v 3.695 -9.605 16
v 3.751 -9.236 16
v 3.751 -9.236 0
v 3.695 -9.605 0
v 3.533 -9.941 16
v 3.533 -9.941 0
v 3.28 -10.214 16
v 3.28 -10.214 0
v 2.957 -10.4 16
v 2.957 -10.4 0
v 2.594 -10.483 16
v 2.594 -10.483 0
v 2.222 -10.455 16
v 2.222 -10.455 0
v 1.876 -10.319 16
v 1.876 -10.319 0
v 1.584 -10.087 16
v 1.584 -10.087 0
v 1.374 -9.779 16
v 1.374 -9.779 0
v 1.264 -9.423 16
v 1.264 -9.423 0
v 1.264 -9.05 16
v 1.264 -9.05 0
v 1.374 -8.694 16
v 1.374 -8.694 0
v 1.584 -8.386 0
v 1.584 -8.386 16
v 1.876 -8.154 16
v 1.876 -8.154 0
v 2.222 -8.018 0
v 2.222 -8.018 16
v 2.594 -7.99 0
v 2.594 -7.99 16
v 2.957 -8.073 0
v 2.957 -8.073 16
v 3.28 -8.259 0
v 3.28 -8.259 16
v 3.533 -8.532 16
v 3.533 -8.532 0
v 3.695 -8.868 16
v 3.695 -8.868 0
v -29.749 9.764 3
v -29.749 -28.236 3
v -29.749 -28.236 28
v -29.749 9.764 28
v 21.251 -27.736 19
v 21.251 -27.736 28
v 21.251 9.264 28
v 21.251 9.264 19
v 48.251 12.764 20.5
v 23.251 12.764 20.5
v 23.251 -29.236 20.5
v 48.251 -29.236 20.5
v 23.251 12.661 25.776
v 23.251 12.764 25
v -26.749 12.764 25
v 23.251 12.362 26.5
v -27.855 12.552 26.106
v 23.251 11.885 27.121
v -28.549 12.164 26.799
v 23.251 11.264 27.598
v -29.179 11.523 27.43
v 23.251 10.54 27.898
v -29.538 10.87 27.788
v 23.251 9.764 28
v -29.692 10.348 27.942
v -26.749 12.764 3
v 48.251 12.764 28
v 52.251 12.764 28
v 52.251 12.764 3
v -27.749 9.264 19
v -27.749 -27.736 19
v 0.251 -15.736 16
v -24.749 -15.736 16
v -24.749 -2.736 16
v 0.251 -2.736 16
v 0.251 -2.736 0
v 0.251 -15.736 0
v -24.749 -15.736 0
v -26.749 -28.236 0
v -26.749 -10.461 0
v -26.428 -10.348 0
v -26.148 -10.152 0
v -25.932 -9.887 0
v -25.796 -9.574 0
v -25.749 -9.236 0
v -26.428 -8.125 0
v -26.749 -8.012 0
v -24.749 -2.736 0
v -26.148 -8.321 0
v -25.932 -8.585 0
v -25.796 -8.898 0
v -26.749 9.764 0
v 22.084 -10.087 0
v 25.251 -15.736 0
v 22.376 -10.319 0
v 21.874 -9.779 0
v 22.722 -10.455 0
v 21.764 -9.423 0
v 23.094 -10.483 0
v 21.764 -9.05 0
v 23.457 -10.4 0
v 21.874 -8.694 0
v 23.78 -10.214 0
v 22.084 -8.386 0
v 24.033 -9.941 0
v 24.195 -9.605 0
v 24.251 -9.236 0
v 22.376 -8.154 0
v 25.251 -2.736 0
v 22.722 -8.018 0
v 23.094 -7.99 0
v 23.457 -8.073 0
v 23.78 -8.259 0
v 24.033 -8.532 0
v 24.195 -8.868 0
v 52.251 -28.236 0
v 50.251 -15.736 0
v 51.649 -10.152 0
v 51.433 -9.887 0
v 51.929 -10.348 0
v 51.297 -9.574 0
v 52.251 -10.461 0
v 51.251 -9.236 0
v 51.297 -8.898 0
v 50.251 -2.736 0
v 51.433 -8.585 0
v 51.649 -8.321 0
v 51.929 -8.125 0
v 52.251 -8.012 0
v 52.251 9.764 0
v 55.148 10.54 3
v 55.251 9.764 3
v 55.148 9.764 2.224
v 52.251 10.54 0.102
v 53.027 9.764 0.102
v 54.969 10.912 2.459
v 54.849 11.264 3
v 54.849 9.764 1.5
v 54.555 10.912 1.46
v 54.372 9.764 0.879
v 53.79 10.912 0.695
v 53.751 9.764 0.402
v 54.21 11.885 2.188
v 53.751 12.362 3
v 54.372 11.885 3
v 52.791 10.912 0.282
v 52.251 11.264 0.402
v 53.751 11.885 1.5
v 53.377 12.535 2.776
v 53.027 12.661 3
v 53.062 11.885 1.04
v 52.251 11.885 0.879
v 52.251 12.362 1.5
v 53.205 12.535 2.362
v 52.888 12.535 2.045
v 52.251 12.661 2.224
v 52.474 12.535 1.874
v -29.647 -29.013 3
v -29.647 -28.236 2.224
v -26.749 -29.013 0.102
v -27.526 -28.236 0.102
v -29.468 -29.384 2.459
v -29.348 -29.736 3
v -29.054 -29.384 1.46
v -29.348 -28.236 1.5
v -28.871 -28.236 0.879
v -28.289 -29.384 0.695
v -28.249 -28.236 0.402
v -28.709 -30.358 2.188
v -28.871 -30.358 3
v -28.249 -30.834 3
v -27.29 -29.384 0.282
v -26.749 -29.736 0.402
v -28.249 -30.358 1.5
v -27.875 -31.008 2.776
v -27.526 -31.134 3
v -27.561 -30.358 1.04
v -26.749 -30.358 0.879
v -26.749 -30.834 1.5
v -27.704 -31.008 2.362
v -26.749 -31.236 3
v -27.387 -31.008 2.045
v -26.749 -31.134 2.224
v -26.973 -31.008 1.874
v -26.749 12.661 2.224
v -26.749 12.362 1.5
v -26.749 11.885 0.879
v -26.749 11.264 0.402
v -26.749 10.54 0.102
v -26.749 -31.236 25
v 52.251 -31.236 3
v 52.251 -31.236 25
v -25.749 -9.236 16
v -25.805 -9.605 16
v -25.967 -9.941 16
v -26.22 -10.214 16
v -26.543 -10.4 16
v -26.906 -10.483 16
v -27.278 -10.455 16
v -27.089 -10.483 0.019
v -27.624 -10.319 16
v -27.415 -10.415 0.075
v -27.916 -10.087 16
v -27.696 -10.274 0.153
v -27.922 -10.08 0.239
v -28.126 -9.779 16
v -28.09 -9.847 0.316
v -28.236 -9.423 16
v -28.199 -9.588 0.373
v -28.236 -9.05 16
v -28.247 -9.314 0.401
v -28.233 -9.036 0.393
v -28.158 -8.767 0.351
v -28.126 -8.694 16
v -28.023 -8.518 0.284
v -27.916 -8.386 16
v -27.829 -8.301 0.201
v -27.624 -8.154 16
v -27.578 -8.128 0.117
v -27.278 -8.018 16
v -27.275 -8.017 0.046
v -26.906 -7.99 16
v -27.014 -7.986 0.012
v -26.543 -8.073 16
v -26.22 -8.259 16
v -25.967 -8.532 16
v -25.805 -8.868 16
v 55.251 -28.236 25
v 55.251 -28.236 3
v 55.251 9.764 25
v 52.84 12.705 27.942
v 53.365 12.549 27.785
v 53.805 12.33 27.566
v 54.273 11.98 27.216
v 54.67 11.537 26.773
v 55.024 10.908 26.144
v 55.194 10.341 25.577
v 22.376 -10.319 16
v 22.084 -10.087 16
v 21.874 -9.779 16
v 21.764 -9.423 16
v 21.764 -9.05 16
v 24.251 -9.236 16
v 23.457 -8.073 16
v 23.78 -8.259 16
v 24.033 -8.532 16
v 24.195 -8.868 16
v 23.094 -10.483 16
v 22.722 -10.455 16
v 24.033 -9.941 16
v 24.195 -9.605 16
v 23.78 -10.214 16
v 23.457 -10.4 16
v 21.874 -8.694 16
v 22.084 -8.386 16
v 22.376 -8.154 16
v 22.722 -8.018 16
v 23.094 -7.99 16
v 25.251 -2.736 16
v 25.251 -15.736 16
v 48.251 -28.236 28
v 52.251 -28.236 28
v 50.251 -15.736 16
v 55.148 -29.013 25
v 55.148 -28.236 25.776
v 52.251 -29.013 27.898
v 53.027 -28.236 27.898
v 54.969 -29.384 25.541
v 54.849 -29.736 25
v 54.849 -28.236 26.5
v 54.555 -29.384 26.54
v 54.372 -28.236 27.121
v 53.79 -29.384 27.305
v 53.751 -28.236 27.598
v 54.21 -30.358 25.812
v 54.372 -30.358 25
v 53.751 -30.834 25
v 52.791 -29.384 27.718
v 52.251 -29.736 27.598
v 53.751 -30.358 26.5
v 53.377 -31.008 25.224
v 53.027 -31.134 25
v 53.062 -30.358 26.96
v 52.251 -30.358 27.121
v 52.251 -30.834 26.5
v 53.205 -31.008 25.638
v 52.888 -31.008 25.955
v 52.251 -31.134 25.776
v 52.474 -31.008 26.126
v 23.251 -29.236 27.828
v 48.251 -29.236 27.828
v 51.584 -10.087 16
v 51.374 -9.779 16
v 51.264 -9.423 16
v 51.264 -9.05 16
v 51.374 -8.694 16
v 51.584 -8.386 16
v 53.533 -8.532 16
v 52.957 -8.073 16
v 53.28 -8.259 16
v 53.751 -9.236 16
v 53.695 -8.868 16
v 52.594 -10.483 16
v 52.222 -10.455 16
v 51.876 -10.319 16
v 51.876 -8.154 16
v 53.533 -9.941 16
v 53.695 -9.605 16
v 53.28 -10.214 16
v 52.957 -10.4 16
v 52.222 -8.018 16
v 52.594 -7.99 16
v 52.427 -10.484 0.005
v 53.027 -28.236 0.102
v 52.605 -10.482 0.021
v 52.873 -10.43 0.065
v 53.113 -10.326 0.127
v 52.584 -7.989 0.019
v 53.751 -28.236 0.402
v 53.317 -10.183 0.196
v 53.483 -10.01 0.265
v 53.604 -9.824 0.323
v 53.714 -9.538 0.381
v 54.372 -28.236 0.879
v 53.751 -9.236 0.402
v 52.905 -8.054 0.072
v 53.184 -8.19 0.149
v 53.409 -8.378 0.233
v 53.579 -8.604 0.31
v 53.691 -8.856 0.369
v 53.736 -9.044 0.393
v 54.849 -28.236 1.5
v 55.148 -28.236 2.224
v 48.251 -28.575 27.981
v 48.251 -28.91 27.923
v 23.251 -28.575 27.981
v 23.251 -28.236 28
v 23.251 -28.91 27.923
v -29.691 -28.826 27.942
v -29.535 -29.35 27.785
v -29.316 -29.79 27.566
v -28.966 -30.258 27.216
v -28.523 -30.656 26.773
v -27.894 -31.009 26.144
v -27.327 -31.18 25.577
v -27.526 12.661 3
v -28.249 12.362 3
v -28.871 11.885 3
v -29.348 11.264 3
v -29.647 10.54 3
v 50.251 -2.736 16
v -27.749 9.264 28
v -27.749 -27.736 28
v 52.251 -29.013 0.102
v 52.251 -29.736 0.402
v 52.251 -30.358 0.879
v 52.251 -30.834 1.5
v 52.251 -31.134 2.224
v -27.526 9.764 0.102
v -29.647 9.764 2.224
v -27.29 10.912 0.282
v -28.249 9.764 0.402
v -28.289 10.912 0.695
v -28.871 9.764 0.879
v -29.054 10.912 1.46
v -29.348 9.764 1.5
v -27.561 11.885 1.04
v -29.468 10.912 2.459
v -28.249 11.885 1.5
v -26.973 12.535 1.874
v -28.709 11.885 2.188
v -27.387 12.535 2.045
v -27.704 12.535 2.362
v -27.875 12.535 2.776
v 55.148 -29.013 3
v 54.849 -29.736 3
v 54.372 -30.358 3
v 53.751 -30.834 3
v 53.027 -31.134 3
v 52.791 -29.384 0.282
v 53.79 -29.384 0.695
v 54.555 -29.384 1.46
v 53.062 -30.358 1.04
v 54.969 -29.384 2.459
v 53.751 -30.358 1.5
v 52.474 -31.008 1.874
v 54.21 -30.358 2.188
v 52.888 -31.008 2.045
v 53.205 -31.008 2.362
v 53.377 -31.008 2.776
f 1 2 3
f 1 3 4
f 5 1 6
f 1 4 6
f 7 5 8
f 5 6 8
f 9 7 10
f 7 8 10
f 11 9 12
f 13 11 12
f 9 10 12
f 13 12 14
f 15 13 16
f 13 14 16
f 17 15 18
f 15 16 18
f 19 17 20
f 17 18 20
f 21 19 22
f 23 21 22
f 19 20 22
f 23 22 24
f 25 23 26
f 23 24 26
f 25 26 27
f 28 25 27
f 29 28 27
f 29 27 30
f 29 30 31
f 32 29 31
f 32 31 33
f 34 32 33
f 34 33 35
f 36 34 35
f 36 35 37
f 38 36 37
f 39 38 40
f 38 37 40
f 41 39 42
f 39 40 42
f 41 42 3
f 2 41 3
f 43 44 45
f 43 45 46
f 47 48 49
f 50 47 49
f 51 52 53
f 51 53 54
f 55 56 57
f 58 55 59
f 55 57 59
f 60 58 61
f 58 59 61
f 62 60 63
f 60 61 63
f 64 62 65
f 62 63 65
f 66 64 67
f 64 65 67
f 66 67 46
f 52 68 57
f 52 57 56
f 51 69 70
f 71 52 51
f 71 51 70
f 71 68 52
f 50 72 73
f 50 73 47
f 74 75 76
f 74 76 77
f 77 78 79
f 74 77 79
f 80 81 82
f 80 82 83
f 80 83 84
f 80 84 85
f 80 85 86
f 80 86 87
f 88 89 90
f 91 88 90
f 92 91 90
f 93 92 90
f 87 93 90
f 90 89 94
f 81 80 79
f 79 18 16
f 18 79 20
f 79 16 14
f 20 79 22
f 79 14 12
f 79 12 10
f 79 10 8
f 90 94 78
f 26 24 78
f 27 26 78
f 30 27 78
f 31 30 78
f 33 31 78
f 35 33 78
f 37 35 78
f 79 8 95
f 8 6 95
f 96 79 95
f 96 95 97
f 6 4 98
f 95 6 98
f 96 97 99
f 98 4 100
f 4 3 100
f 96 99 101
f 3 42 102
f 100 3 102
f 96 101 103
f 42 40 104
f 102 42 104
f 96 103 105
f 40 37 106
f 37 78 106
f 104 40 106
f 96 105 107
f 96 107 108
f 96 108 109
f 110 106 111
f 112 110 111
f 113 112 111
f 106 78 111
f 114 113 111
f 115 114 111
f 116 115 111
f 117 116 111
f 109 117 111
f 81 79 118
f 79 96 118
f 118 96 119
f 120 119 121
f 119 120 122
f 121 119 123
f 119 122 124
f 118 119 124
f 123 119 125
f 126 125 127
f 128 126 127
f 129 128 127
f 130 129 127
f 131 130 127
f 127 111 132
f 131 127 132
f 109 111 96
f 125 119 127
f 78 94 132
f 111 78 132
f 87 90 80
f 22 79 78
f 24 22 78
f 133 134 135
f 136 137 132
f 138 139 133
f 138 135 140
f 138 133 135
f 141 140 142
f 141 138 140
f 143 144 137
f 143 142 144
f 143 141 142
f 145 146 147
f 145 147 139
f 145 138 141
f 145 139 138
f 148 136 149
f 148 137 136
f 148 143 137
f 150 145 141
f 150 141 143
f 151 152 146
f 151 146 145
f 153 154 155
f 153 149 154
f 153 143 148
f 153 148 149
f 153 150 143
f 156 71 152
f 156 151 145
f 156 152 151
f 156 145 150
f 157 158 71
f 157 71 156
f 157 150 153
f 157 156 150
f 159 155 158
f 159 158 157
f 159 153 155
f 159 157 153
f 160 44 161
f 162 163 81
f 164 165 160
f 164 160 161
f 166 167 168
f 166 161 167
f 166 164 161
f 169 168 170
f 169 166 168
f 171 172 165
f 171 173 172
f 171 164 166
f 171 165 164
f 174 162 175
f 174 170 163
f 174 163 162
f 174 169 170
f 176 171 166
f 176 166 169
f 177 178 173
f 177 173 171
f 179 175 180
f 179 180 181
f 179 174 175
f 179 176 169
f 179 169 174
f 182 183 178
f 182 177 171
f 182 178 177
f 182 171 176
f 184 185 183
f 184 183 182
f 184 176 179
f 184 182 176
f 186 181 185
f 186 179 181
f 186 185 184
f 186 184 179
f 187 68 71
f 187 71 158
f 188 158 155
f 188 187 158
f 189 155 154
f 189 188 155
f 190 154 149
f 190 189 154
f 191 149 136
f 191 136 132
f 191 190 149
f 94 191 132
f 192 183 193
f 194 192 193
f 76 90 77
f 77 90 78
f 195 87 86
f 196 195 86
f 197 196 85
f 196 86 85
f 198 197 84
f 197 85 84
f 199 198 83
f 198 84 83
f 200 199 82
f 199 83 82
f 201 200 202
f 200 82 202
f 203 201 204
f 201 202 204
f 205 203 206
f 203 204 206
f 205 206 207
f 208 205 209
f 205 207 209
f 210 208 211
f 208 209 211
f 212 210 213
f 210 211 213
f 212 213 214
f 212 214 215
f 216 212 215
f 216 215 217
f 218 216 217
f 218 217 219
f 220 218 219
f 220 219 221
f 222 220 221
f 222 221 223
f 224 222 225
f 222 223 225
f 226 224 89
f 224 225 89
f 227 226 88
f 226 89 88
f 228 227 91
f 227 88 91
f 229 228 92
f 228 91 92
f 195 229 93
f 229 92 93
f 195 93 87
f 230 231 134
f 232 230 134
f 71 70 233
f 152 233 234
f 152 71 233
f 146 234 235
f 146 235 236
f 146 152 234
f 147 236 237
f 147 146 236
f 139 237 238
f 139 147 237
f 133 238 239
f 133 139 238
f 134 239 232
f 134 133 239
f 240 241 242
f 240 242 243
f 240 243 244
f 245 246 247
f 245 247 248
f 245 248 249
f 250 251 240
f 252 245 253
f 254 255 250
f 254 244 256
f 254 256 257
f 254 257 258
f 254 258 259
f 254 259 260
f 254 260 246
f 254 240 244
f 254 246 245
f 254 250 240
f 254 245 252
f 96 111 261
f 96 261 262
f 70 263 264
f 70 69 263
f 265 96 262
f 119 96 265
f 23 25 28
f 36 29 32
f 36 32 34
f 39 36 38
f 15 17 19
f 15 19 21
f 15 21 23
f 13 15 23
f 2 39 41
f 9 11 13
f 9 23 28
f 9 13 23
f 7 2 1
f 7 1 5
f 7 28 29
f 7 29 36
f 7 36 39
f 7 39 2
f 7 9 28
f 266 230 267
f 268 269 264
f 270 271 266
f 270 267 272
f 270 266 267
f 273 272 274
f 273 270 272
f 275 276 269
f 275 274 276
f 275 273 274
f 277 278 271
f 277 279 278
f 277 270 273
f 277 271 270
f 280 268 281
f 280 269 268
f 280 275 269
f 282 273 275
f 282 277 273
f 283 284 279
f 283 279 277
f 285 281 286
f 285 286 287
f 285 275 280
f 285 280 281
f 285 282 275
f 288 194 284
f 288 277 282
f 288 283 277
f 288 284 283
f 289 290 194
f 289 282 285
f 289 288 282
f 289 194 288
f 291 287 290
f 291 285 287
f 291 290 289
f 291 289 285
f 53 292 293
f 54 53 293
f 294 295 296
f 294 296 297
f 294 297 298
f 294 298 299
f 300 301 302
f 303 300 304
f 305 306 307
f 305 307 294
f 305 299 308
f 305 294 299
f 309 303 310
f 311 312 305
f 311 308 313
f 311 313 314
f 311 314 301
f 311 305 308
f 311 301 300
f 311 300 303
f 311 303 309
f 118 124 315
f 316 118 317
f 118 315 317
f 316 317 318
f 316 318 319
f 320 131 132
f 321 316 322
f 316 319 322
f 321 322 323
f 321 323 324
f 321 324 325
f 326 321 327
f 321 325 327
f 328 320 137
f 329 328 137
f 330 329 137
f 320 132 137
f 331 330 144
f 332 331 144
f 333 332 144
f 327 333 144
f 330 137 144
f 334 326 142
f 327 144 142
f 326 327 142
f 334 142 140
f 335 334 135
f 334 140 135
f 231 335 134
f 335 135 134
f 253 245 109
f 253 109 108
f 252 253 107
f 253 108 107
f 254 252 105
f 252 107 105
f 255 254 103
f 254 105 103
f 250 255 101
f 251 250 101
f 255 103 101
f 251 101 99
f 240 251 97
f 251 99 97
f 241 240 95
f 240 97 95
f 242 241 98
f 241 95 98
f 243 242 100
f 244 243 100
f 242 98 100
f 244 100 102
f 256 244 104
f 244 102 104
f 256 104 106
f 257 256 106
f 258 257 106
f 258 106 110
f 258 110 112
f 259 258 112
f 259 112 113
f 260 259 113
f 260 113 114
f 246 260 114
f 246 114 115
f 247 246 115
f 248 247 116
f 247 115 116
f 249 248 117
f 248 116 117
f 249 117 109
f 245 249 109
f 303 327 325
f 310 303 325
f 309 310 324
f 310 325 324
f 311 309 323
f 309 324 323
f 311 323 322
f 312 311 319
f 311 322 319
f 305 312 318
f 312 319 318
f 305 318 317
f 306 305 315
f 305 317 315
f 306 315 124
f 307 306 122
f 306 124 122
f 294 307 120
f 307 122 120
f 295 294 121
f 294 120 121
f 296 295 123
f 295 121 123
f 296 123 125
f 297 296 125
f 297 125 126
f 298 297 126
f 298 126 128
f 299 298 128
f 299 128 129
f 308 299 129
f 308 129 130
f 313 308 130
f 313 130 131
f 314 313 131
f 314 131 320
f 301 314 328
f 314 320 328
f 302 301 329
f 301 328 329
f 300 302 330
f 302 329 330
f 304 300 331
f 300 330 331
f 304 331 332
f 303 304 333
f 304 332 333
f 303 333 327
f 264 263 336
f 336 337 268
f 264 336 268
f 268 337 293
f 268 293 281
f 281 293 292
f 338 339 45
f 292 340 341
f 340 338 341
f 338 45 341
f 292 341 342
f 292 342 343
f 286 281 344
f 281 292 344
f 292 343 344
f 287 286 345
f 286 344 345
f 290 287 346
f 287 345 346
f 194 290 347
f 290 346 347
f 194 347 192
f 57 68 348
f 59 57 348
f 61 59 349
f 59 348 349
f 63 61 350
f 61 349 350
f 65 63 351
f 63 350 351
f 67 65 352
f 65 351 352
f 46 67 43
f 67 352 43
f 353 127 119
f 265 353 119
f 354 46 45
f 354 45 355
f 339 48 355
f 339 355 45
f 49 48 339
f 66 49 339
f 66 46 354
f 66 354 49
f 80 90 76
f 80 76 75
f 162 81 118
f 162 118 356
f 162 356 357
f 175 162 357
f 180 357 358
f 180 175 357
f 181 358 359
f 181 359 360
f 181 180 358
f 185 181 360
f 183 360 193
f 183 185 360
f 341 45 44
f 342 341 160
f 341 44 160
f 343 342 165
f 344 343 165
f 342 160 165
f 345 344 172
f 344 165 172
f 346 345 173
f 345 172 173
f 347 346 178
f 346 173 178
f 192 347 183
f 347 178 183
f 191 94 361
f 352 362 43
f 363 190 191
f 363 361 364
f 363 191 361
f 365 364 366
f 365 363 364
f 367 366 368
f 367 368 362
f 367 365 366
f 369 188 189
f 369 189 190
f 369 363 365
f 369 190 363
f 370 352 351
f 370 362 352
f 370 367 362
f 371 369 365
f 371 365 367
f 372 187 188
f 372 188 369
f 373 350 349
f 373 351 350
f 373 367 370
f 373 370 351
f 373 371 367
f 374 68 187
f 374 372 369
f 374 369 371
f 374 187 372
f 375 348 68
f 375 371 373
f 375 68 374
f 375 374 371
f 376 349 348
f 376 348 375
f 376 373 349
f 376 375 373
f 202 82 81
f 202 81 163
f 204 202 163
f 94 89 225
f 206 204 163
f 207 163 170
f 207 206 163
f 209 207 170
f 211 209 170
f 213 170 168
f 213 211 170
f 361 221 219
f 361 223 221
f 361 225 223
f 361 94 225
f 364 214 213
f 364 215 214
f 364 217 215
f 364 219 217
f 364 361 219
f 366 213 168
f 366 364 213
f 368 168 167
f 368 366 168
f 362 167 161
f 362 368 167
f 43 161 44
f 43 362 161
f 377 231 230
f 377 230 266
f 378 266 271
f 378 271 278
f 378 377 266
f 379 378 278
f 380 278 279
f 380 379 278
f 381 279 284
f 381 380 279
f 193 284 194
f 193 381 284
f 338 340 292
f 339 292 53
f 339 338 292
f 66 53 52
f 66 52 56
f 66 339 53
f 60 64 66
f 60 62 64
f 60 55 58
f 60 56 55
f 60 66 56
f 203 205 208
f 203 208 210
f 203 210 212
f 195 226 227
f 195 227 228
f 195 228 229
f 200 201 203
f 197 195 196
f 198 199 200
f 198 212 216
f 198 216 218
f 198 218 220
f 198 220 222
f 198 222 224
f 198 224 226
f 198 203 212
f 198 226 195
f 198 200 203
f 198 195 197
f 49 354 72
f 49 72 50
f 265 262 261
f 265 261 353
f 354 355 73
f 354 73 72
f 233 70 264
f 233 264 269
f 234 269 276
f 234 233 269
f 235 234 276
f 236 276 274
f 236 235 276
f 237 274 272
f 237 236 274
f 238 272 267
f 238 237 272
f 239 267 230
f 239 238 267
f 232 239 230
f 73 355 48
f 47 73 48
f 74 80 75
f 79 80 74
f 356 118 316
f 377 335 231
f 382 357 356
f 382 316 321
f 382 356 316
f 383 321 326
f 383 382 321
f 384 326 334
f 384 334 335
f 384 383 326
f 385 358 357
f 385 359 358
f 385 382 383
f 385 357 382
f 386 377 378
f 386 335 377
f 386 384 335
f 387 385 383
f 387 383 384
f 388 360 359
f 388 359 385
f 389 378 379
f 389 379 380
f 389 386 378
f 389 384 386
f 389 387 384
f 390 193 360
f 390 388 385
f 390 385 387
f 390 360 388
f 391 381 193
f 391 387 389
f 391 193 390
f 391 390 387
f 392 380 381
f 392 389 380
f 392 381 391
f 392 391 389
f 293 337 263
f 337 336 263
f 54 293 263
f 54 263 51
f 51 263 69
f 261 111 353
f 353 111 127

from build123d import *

# Parameters (mm, degrees)
F0_W         = 85
F0_H         = 44
F1_DEPTH     = 28
F2_W         = 49
F2_H         = 37
F3_DEPTH     = 9
F2_W_2       = 25
F2_H_2       = 42
F4_DEPTH     = 7.5
F5_W         = 25
F5_H         = 13
F5_R         = 1.25
F6_DEPTH     = 16
F7_T1_DEPTH  = 22
F7_T3_DEPTH  = 32.5
F7_T5_DEPTH  = 79
F7_T7_DEPTH  = 38
F7_T9_DEPTH  = 68
F7_T11_DEPTH = 89.5
F7_T13_DEPTH = 48.5
F7_S17_W     = 3
F7_S17_H     = 3
F7_T18_DEPTH = 3
F7_S23_W     = 3
F7_S23_H     = 3
F7_T24_DEPTH = 3
F7_S29_W     = 3
F7_S29_H     = 3
F7_T30_DEPTH = 3
F7_S35_W     = 3
F7_S35_H     = 3
F7_T36_DEPTH = 3
F7_S41_W     = 3
F7_S41_H     = 3
F7_T42_DEPTH = 3


# Not quite as in the source:
# - a fillet or chamfer that OpenCascade refuses, or shapes differently, is made with other operations: its cross-section is extruded or revolved along the edge and cut away or added


with BuildPart() as f1:
    # F0 (on Top) → F1 (new body)
    with BuildSketch(Plane.XY):
        with Locations((12.7505162358, -9.2363715138)):
            Rectangle(F0_W, F0_H)
    extrude(amount=F1_DEPTH)

    # F2 (on face) → F3 (cut)
    with BuildSketch(Plane.XY.offset(28)):
        with Locations((-3.2494837642, -9.2363715138)):
            Rectangle(F2_W, F2_H)
    extrude(amount=-F3_DEPTH, mode=Mode.SUBTRACT)

    # F2 (on face) → F4 (cut)
    with BuildSketch(Plane.XY.offset(28)):
        with Locations((35.7505162358, -8.2363715138)):
            Rectangle(F2_W_2, F2_H_2)
    extrude(amount=-F4_DEPTH, mode=Mode.SUBTRACT)

    # F5 (on face) → F6 (cut)
    with BuildSketch(Plane(origin=(0, 0, 0), x_dir=(1, 0, 0), z_dir=(0, 0, -1))):
        with Locations((-12.2494837642, 9.2363715138)):
            Rectangle(F5_W, F5_H)
        with Locations((37.7505162358, 9.2363715138)):
            Rectangle(F5_W, F5_H)
        with Locations((-26.9994837642, 9.2363715138)):
            Circle(F5_R)
        with Locations((2.5005162358, 9.2363715138)):
            Circle(F5_R)
        with Locations((23.0005162358, 9.2363715138)):
            Circle(F5_R)
        with Locations((52.5005162358, 9.2363715138)):
            Circle(F5_R)
    extrude(amount=-F6_DEPTH, mode=Mode.SUBTRACT)

    # F7: fillet of radius 3 on 11 edges, made by hand

    # F7_s2 → F7_t1 (cut)
    with BuildSketch(Plane.XY.offset(3)):
        with BuildLine():
            ThreePointArc((55.2505162358, -28.2363715138), (54.3718365794, -30.3576918574), (52.2505162358, -31.2363715138))
            Line((52.2505162358, -31.2363715138), (55.2505162358, -31.2363715138))
            Line((55.2505162358, -31.2363715138), (55.2505162358, -28.2363715138))
        make_face()
    extrude(amount=F7_T1_DEPTH, mode=Mode.SUBTRACT)

    # F7_s4 → F7_t3 (cut)
    with BuildSketch(Plane.XY.offset(3)):
        with BuildLine():
            ThreePointArc((52.2505162358, 12.7636284862), (54.3718365794, 11.8849488297), (55.2505162358, 9.7636284862))
            Line((55.2505162358, 9.7636284862), (55.2505162358, 12.7636284862))
            Line((55.2505162358, 12.7636284862), (52.2505162358, 12.7636284862))
        make_face()
        with BuildLine():
            ThreePointArc((-29.7494837642, -28.2363715138), (-28.8708041077, -30.3576918574), (-26.7494837642, -31.2363715138))
            Line((-26.7494837642, -31.2363715138), (-29.7494837642, -31.2363715138))
            Line((-29.7494837642, -31.2363715138), (-29.7494837642, -28.2363715138))
        make_face()
        with BuildLine():
            ThreePointArc((-26.7494837642, 12.7636284862), (-28.8708041077, 11.8849488297), (-29.7494837642, 9.7636284862))
            Line((-29.7494837642, 9.7636284862), (-29.7494837642, 12.7636284862))
            Line((-29.7494837642, 12.7636284862), (-26.7494837642, 12.7636284862))
        make_face()
    extrude(amount=F7_T3_DEPTH, mode=Mode.SUBTRACT)

    # F7_s6 → F7_t5 (cut)
    with BuildSketch(Plane.YZ.offset(-26.7494837642)):
        with BuildLine():
            ThreePointArc((12.7636284862, 3), (11.8849488297, 0.8786796564), (9.7636284862, 0))
            Line((9.7636284862, 0), (12.7636284862, 0))
            Line((12.7636284862, 0), (12.7636284862, 3))
        make_face()
        with BuildLine():
            ThreePointArc((-28.2363715138, 0), (-30.3576918574, 0.8786796564), (-31.2363715138, 3))
            Line((-31.2363715138, 3), (-31.2363715138, 0))
            Line((-31.2363715138, 0), (-28.2363715138, 0))
        make_face()
    extrude(amount=F7_T5_DEPTH, mode=Mode.SUBTRACT)

    # F7_s8 → F7_t7 (cut)
    with BuildSketch(Plane.XZ.offset(-9.7636284862)):
        with BuildLine():
            ThreePointArc((-26.7494837642, 0), (-28.8708041077, 0.8786796564), (-29.7494837642, 3))
            Line((-29.7494837642, 3), (-29.7494837642, 0))
            Line((-29.7494837642, 0), (-26.7494837642, 0))
        make_face()
        with BuildLine():
            ThreePointArc((52.2505162358, 0), (54.3718365794, 0.8786796564), (55.2505162358, 3))
            Line((55.2505162358, 3), (55.2505162358, 0))
            Line((55.2505162358, 0), (52.2505162358, 0))
        make_face()
    extrude(amount=F7_T7_DEPTH, mode=Mode.SUBTRACT)

    # F7_s10 → F7_t9 (cut)
    with BuildSketch(Plane.YZ.offset(-37.2494837642)):
        with BuildLine():
            ThreePointArc((12.7636284862, 25), (11.8849488297, 27.1213203436), (9.7636284862, 28))
            Line((9.7636284862, 28), (12.7636284862, 28))
            Line((12.7636284862, 28), (12.7636284862, 25))
        make_face()
    extrude(amount=F7_T9_DEPTH, mode=Mode.SUBTRACT)

    # F7_s12 → F7_t11 (cut)
    with BuildSketch(Plane.YZ.offset(-37.2494837642)):
        with BuildLine():
            ThreePointArc((-28.2363715138, 28), (-30.3576918574, 27.1213203436), (-31.2363715138, 25))
            Line((-31.2363715138, 25), (-31.2363715138, 28))
            Line((-31.2363715138, 28), (-28.2363715138, 28))
        make_face()
    extrude(amount=F7_T11_DEPTH, mode=Mode.SUBTRACT)

    # F7_s14 → F7_t13 (cut)
    with BuildSketch(Plane.XZ.offset(-20.2636284862)):
        with BuildLine():
            ThreePointArc((52.2505162358, 28), (54.3718365794, 27.1213203436), (55.2505162358, 25))
            Line((55.2505162358, 25), (55.2505162358, 28))
            Line((55.2505162358, 28), (52.2505162358, 28))
        make_face()
    extrude(amount=F7_T13_DEPTH, mode=Mode.SUBTRACT)


with BuildPart() as f7_tool16:
    # F7_s17 → F7_t18 (new body)
    with BuildSketch(Plane.XZ.offset(28.2363715138)):
        with Locations((53.7505162358, 1.5)):
            Rectangle(F7_S17_W, F7_S17_H)
    extrude(amount=F7_T18_DEPTH)

    # F7_s19 → F7_t20 (revolve, cut)
    with BuildSketch(Plane(origin=(52.2505162358, -28.2363715138, 3), x_dir=(-0.7071067812, 0, 0.7071067812), z_dir=(0.7071067812, 0, 0.7071067812))):
        with BuildLine():
            ThreePointArc((0, -3), (3, 0), (0, 3))
            Line((0, 3), (0, -3))
        make_face()
    revolve(axis=Axis((52.2505162358, -28.2363715138, 3), (0, -1, 0)), mode=Mode.SUBTRACT)


with BuildPart() as f1_1:
    add(f1.part)

    # F7_t15: cut F7_tool16
    add(f7_tool16.part, mode=Mode.SUBTRACT)


with BuildPart() as f7_tool22:
    # F7_s23 → F7_t24 (new body)
    with BuildSketch(Plane.XZ.offset(28.2363715138)):
        with Locations((53.7505162358, 26.5)):
            Rectangle(F7_S23_W, F7_S23_H)
    extrude(amount=F7_T24_DEPTH)

    # F7_s25 → F7_t26 (revolve, cut)
    with BuildSketch(Plane(origin=(52.2505162358, -28.2363715138, 25), x_dir=(-0.7071067812, 0, -0.7071067812), z_dir=(-0.7071067812, 0, 0.7071067812))):
        with BuildLine():
            ThreePointArc((0, -3), (3, 0), (0, 3))
            Line((0, 3), (0, -3))
        make_face()
    revolve(axis=Axis((52.2505162358, -28.2363715138, 25), (0, -1, 0)), mode=Mode.SUBTRACT)


with BuildPart() as f1_2:
    add(f1_1.part)

    # F7_t21: cut F7_tool22
    add(f7_tool22.part, mode=Mode.SUBTRACT)


with BuildPart() as f7_tool28:
    # F7_s29 → F7_t30 (new body)
    with BuildSketch(Plane.XZ.offset(-9.7636284862)):
        with Locations((53.7505162358, 1.5)):
            Rectangle(F7_S29_W, F7_S29_H)
    extrude(amount=-F7_T30_DEPTH)

    # F7_s31 → F7_t32 (revolve, cut)
    with BuildSketch(Plane(origin=(52.2505162358, 9.7636284862, 3), x_dir=(-0.7071067812, 0, 0.7071067812), z_dir=(-0.7071067812, 0, -0.7071067812))):
        with BuildLine():
            ThreePointArc((0, -3), (3, 0), (0, 3))
            Line((0, 3), (0, -3))
        make_face()
    revolve(axis=Axis((52.2505162358, 9.7636284862, 3), (0, 1, 0)), mode=Mode.SUBTRACT)


with BuildPart() as f1_3:
    add(f1_2.part)

    # F7_t27: cut F7_tool28
    add(f7_tool28.part, mode=Mode.SUBTRACT)


with BuildPart() as f7_tool34:
    # F7_s35 → F7_t36 (new body)
    with BuildSketch(Plane.XZ.offset(28.2363715138)):
        with Locations((-28.2494837642, 1.5)):
            Rectangle(F7_S35_W, F7_S35_H)
    extrude(amount=F7_T36_DEPTH)

    # F7_s37 → F7_t38 (revolve, cut)
    with BuildSketch(Plane(origin=(-26.7494837642, -28.2363715138, 3), x_dir=(0.7071067812, 0, 0.7071067812), z_dir=(0.7071067812, 0, -0.7071067812))):
        with BuildLine():
            ThreePointArc((0, -3), (3, 0), (0, 3))
            Line((0, 3), (0, -3))
        make_face()
    revolve(axis=Axis((-26.7494837642, -28.2363715138, 3), (0, -1, 0)), mode=Mode.SUBTRACT)


with BuildPart() as f1_4:
    add(f1_3.part)

    # F7_t33: cut F7_tool34
    add(f7_tool34.part, mode=Mode.SUBTRACT)


with BuildPart() as f7_tool40:
    # F7_s41 → F7_t42 (new body)
    with BuildSketch(Plane.XZ.offset(-9.7636284862)):
        with Locations((-28.2494837642, 1.5)):
            Rectangle(F7_S41_W, F7_S41_H)
    extrude(amount=-F7_T42_DEPTH)

    # F7_s43 → F7_t44 (revolve, cut)
    with BuildSketch(Plane(origin=(-26.7494837642, 9.7636284862, 3), x_dir=(0.7071067812, 0, 0.7071067812), z_dir=(-0.7071067812, 0, 0.7071067812))):
        with BuildLine():
            ThreePointArc((0, -3), (3, 0), (0, 3))
            Line((0, 3), (0, -3))
        make_face()
    revolve(axis=Axis((-26.7494837642, 9.7636284862, 3), (0, 1, 0)), mode=Mode.SUBTRACT)


with BuildPart() as f1_5:
    add(f1_4.part)

    # F7_t39: cut F7_tool40
    add(f7_tool40.part, mode=Mode.SUBTRACT)


solid = f1_5.part
